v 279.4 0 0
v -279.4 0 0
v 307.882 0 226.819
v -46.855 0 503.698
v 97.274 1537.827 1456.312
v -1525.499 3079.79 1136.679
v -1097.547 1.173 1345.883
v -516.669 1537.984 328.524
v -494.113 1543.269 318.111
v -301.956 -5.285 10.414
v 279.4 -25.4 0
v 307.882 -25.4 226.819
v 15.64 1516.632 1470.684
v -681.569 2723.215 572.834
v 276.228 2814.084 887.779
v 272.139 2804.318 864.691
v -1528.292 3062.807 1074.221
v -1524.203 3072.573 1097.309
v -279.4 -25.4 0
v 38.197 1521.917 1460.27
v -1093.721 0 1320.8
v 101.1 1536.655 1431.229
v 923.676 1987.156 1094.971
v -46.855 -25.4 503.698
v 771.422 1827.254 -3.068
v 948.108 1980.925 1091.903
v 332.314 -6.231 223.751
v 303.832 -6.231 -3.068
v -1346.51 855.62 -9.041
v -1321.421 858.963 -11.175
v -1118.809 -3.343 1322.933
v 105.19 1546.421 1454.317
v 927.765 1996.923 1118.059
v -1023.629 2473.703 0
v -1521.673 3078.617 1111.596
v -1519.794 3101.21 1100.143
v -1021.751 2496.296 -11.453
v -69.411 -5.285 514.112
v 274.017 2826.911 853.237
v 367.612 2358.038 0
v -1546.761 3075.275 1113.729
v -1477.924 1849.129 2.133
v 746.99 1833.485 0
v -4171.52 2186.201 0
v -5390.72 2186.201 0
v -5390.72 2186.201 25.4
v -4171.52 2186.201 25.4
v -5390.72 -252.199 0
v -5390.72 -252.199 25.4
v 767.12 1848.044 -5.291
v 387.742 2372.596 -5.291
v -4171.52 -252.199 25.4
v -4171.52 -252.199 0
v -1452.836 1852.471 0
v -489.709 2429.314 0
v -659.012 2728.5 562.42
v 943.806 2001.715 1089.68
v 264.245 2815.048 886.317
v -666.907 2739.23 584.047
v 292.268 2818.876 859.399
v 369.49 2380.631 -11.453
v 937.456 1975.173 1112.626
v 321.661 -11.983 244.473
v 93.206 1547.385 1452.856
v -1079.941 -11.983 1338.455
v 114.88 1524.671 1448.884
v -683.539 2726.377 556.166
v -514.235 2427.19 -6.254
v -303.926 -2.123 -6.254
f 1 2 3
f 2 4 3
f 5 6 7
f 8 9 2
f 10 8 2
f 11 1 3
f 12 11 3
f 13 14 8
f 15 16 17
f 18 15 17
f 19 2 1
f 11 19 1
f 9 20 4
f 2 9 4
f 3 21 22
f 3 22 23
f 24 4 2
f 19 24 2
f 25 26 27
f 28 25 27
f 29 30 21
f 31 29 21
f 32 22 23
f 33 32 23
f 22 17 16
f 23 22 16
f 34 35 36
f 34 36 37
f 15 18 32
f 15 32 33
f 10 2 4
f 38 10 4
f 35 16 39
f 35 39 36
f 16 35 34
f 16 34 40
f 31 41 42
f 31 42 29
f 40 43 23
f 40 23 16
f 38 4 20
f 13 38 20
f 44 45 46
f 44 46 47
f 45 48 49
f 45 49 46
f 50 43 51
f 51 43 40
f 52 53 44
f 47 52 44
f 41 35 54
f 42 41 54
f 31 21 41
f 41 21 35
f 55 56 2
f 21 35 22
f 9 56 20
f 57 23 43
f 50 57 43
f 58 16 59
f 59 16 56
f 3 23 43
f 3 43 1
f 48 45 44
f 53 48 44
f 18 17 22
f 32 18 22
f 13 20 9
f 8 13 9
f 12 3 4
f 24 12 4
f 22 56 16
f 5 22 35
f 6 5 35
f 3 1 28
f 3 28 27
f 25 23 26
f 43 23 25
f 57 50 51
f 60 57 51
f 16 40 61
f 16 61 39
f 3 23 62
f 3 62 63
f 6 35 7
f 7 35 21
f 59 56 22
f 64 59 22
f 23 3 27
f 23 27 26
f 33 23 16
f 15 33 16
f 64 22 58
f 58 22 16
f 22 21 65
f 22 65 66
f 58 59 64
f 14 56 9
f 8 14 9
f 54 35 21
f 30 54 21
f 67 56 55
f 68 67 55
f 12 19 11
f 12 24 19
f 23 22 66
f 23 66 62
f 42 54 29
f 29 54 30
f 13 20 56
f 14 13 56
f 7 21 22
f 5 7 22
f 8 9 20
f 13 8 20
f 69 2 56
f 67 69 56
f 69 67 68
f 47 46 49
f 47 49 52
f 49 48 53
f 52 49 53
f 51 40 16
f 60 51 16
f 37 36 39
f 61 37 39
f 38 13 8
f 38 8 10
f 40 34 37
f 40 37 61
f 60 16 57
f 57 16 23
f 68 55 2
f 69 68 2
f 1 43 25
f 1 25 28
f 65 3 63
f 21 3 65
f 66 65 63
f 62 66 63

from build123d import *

# Parameters (mm, degrees)
F16_DEPTH = 25.4
F17_DEPTH = 25.4
F18_DEPTH = 25.4
F19_DEPTH = 25.4
F20_DEPTH = 25.4
F21_DEPTH = 25.4
F22_DEPTH = 25.4
F23_DEPTH = 25.4
F26_DEPTH = 25.4
F31_DEPTH = 25.4
F32_DEPTH = 25.4
F33_W     = 1219.2
F33_H     = 2438.4
F34_DEPTH = 25.4
F35_DEPTH = 25.4


with BuildPart() as f16:
    # F1 (on Front) → F16 (new body)
    with BuildSketch(Plane.XZ):
        Polygon((-279.4, 0), (279.4, 0), (307.8816668442, 226.8187705058), (-46.8548983335, 503.6984086037), align=None)
    extrude(amount=F16_DEPTH)


with BuildPart() as f17:
    # F3 (on 3pt) → F17 (new body)
    with BuildSketch(Plane(origin=(258.5105207119, -65.9273870343, -32.4612046447), x_dir=(-0.2433976143, -0.9694449316, 0.0305634747), z_dir=(-0.9618911087, 0.245309039, 0.12078481))):
        Polygon((-2117.7925844661, 1201.5217848882), (-1959.2784362289, 93.0687444366), (-68.0052934274, 34.810926143), (-68.0052934274, 263.410926143), align=None)
    extrude(amount=-F17_DEPTH)


with BuildPart() as f18:
    # F5 (on 3pt) → F18 (new body)
    with BuildSketch(Plane(origin=(176.1431812931, -153.1772461427, 225.6736087228), x_dir=(0.8400492209, 0.3046768722, -0.4488756064), z_dir=(-0.5425101902, 0.4717765191, -0.6950608675))):
        Polygon((889.8676974818, -2259.1248491661), (156.8223412087, -127.3827382517), (-1511.6540853023, -741.7689475509), (-89.3313576369, -2075.2221325219), align=None)
    extrude(amount=-F18_DEPTH)


with BuildPart() as f19:
    # F7 (on 3pt) → F19 (new body)
    with BuildSketch(Plane(origin=(1302.0191575201, 941.6738739175, -342.252174384), x_dir=(-0.5543439336, 0.8194324638, 0.1457163019), z_dir=(0.7925098321, 0.5731757473, -0.2083212153))):
        Polygon((1275.8611263971, 1293.8184315341), (1088.3279929288, 189.904394152), (1728.4690277042, 93.4565965208), (2273.0899174363, 905.4658028292), align=None)
    extrude(amount=F19_DEPTH)


with BuildPart() as f20:
    # F9 (on 3pt) → F20 (new body)
    with BuildSketch(Plane(origin=(157.1206243191, 1889.8710953135, -958.0431618682), x_dir=(0.9972618594, -0.0659599829, 0.0334374713), z_dir=(-0.0739512261, -0.8894967495, 0.450917674))):
        Polygon((-1683.4026535863, 2383.4902749533), (-1183.9918683013, 1118.4989686478), (-648.6051863466, 1098.4281154192), (211.0692676119, 1066.2001942338), (115.3338729538, 2039.2395556533), align=None)
    extrude(amount=-F20_DEPTH)


with BuildPart() as f21:
    # F11 (on 3pt) → F21 (new body)
    with BuildSketch(Plane(origin=(-260.5111936895, -22.5527656992, -66.4237776601), x_dir=(0.0810020736, -0.9964999236, 0.0206534838), z_dir=(-0.9656060842, -0.0835936739, -0.2462051743))):
        Polygon((-2760.7156026321, 707.8059065245), (-2460.4782874181, 120.9922708969), (-22.6319793566, 69.0313406617), align=None)
    extrude(amount=F21_DEPTH)


with BuildPart() as f22:
    # F13 (on 3pt) → F22 (new body)
    with BuildSketch(Plane(origin=(-220.3405442372, -51.624199763, 101.7257815107), x_dir=(0.1889020777, -0.9781156238, -0.0872114188), z_dir=(-0.888043026, -0.2080620738, 0.4099875089))):
        Polygon((-1608.747287406, 1341.8075368411), (-2842.3268717395, 234.3959760147), (-1630.5768910629, 81.7039933705), align=None)
    extrude(amount=F22_DEPTH)


with BuildPart() as f23:
    # F15 (on 3pt) → F23 (new body)
    with BuildSketch(Plane(origin=(307.1813398677, 733.685038507, 1734.4014121101), x_dir=(0.986956196, -0.0627204998, -0.1482686952), z_dir=(0.1609890278, 0.3845130734, 0.908973173))):
        Polygon((-1859.731536833, 2402.2921811744), (-208.8045009332, 857.6383668308), (624.6422180254, 1403.5482178059), (-35.5057733039, 2245.8591196962), align=None)
    extrude(amount=F23_DEPTH)


with BuildPart() as f26:
    # F25 (on 3pt) → F26 (new body)
    with BuildSketch(Plane(origin=(-570.7183420249, 775.7685880845, 1563.5274522631), x_dir=(0.950478354, 0.138135192, 0.2784054011), z_dir=(-0.3107907634, 0.422453063, 0.8514355589))):
        Polygon((886.7714192624, 2127.7754211615), (-92.8943842417, 2194.2066627047), (706.8217630863, 740.4011281438), align=None)
    extrude(amount=F26_DEPTH)


with BuildPart() as f31:
    # F28 (on 3pt) → F31 (new body)
    with BuildSketch(Plane(origin=(-221.3012550993, 67.8190181099, 1450.7140192517), x_dir=(0.988588513, 0.0070345971, 0.1504767972), z_dir=(-0.1506411366, 0.0461648262, 0.9875100287))):
        Polygon((-882.489922541, -61.6783440279), (326.1232502517, 1468.1430627693), (-1315.3818438356, 3023.3495508983), align=None)
    extrude(amount=F31_DEPTH)


with BuildPart() as f32:
    # F30 (on 3pt) → F32 (new body)
    with BuildSketch(Plane(origin=(-1176.6387227062, -156.7630519988, 100.0528784431), x_dir=(0.1311228201, -0.9913034295, -0.0111497398), z_dir=(-0.9877389007, -0.131596013, 0.0839901987))):
        Polygon((-3263.763717823, 978.6721667049), (-2026.8612646883, -123.0944772383), (-1024.6365331789, -123.0944772383), (-158.1383129845, 1223.3829609431), align=None)
    extrude(amount=F32_DEPTH)


with BuildPart() as f34:
    # F33 (on Top) → F34 (new body)
    with BuildSketch(Plane.XY):
        with Locations((-4781.1198914323, 967.000991106)):
            Rectangle(F33_W, F33_H)
    extrude(amount=F34_DEPTH)


with BuildPart() as f35:
    # F13 (on 3pt) → F35 (new body)
    with BuildSketch(Plane(origin=(-220.3405442372, -51.624199763, 101.7257815107), x_dir=(0.1889020777, -0.9781156238, -0.0872114188), z_dir=(-0.888043026, -0.2080620738, 0.4099875089))):
        Polygon((-1608.747287406, 1341.8075368411), (-1630.5768910629, 81.7039933705), (-52.77924052, -117.1134651108), (-52.77924052, 437.6741619492), align=None)
    extrude(amount=F35_DEPTH)


solid = Compound([f16.part, f17.part, f18.part, f19.part, f20.part, f21.part, f22.part, f23.part, f26.part, f31.part, f32.part, f34.part, f35.part])
